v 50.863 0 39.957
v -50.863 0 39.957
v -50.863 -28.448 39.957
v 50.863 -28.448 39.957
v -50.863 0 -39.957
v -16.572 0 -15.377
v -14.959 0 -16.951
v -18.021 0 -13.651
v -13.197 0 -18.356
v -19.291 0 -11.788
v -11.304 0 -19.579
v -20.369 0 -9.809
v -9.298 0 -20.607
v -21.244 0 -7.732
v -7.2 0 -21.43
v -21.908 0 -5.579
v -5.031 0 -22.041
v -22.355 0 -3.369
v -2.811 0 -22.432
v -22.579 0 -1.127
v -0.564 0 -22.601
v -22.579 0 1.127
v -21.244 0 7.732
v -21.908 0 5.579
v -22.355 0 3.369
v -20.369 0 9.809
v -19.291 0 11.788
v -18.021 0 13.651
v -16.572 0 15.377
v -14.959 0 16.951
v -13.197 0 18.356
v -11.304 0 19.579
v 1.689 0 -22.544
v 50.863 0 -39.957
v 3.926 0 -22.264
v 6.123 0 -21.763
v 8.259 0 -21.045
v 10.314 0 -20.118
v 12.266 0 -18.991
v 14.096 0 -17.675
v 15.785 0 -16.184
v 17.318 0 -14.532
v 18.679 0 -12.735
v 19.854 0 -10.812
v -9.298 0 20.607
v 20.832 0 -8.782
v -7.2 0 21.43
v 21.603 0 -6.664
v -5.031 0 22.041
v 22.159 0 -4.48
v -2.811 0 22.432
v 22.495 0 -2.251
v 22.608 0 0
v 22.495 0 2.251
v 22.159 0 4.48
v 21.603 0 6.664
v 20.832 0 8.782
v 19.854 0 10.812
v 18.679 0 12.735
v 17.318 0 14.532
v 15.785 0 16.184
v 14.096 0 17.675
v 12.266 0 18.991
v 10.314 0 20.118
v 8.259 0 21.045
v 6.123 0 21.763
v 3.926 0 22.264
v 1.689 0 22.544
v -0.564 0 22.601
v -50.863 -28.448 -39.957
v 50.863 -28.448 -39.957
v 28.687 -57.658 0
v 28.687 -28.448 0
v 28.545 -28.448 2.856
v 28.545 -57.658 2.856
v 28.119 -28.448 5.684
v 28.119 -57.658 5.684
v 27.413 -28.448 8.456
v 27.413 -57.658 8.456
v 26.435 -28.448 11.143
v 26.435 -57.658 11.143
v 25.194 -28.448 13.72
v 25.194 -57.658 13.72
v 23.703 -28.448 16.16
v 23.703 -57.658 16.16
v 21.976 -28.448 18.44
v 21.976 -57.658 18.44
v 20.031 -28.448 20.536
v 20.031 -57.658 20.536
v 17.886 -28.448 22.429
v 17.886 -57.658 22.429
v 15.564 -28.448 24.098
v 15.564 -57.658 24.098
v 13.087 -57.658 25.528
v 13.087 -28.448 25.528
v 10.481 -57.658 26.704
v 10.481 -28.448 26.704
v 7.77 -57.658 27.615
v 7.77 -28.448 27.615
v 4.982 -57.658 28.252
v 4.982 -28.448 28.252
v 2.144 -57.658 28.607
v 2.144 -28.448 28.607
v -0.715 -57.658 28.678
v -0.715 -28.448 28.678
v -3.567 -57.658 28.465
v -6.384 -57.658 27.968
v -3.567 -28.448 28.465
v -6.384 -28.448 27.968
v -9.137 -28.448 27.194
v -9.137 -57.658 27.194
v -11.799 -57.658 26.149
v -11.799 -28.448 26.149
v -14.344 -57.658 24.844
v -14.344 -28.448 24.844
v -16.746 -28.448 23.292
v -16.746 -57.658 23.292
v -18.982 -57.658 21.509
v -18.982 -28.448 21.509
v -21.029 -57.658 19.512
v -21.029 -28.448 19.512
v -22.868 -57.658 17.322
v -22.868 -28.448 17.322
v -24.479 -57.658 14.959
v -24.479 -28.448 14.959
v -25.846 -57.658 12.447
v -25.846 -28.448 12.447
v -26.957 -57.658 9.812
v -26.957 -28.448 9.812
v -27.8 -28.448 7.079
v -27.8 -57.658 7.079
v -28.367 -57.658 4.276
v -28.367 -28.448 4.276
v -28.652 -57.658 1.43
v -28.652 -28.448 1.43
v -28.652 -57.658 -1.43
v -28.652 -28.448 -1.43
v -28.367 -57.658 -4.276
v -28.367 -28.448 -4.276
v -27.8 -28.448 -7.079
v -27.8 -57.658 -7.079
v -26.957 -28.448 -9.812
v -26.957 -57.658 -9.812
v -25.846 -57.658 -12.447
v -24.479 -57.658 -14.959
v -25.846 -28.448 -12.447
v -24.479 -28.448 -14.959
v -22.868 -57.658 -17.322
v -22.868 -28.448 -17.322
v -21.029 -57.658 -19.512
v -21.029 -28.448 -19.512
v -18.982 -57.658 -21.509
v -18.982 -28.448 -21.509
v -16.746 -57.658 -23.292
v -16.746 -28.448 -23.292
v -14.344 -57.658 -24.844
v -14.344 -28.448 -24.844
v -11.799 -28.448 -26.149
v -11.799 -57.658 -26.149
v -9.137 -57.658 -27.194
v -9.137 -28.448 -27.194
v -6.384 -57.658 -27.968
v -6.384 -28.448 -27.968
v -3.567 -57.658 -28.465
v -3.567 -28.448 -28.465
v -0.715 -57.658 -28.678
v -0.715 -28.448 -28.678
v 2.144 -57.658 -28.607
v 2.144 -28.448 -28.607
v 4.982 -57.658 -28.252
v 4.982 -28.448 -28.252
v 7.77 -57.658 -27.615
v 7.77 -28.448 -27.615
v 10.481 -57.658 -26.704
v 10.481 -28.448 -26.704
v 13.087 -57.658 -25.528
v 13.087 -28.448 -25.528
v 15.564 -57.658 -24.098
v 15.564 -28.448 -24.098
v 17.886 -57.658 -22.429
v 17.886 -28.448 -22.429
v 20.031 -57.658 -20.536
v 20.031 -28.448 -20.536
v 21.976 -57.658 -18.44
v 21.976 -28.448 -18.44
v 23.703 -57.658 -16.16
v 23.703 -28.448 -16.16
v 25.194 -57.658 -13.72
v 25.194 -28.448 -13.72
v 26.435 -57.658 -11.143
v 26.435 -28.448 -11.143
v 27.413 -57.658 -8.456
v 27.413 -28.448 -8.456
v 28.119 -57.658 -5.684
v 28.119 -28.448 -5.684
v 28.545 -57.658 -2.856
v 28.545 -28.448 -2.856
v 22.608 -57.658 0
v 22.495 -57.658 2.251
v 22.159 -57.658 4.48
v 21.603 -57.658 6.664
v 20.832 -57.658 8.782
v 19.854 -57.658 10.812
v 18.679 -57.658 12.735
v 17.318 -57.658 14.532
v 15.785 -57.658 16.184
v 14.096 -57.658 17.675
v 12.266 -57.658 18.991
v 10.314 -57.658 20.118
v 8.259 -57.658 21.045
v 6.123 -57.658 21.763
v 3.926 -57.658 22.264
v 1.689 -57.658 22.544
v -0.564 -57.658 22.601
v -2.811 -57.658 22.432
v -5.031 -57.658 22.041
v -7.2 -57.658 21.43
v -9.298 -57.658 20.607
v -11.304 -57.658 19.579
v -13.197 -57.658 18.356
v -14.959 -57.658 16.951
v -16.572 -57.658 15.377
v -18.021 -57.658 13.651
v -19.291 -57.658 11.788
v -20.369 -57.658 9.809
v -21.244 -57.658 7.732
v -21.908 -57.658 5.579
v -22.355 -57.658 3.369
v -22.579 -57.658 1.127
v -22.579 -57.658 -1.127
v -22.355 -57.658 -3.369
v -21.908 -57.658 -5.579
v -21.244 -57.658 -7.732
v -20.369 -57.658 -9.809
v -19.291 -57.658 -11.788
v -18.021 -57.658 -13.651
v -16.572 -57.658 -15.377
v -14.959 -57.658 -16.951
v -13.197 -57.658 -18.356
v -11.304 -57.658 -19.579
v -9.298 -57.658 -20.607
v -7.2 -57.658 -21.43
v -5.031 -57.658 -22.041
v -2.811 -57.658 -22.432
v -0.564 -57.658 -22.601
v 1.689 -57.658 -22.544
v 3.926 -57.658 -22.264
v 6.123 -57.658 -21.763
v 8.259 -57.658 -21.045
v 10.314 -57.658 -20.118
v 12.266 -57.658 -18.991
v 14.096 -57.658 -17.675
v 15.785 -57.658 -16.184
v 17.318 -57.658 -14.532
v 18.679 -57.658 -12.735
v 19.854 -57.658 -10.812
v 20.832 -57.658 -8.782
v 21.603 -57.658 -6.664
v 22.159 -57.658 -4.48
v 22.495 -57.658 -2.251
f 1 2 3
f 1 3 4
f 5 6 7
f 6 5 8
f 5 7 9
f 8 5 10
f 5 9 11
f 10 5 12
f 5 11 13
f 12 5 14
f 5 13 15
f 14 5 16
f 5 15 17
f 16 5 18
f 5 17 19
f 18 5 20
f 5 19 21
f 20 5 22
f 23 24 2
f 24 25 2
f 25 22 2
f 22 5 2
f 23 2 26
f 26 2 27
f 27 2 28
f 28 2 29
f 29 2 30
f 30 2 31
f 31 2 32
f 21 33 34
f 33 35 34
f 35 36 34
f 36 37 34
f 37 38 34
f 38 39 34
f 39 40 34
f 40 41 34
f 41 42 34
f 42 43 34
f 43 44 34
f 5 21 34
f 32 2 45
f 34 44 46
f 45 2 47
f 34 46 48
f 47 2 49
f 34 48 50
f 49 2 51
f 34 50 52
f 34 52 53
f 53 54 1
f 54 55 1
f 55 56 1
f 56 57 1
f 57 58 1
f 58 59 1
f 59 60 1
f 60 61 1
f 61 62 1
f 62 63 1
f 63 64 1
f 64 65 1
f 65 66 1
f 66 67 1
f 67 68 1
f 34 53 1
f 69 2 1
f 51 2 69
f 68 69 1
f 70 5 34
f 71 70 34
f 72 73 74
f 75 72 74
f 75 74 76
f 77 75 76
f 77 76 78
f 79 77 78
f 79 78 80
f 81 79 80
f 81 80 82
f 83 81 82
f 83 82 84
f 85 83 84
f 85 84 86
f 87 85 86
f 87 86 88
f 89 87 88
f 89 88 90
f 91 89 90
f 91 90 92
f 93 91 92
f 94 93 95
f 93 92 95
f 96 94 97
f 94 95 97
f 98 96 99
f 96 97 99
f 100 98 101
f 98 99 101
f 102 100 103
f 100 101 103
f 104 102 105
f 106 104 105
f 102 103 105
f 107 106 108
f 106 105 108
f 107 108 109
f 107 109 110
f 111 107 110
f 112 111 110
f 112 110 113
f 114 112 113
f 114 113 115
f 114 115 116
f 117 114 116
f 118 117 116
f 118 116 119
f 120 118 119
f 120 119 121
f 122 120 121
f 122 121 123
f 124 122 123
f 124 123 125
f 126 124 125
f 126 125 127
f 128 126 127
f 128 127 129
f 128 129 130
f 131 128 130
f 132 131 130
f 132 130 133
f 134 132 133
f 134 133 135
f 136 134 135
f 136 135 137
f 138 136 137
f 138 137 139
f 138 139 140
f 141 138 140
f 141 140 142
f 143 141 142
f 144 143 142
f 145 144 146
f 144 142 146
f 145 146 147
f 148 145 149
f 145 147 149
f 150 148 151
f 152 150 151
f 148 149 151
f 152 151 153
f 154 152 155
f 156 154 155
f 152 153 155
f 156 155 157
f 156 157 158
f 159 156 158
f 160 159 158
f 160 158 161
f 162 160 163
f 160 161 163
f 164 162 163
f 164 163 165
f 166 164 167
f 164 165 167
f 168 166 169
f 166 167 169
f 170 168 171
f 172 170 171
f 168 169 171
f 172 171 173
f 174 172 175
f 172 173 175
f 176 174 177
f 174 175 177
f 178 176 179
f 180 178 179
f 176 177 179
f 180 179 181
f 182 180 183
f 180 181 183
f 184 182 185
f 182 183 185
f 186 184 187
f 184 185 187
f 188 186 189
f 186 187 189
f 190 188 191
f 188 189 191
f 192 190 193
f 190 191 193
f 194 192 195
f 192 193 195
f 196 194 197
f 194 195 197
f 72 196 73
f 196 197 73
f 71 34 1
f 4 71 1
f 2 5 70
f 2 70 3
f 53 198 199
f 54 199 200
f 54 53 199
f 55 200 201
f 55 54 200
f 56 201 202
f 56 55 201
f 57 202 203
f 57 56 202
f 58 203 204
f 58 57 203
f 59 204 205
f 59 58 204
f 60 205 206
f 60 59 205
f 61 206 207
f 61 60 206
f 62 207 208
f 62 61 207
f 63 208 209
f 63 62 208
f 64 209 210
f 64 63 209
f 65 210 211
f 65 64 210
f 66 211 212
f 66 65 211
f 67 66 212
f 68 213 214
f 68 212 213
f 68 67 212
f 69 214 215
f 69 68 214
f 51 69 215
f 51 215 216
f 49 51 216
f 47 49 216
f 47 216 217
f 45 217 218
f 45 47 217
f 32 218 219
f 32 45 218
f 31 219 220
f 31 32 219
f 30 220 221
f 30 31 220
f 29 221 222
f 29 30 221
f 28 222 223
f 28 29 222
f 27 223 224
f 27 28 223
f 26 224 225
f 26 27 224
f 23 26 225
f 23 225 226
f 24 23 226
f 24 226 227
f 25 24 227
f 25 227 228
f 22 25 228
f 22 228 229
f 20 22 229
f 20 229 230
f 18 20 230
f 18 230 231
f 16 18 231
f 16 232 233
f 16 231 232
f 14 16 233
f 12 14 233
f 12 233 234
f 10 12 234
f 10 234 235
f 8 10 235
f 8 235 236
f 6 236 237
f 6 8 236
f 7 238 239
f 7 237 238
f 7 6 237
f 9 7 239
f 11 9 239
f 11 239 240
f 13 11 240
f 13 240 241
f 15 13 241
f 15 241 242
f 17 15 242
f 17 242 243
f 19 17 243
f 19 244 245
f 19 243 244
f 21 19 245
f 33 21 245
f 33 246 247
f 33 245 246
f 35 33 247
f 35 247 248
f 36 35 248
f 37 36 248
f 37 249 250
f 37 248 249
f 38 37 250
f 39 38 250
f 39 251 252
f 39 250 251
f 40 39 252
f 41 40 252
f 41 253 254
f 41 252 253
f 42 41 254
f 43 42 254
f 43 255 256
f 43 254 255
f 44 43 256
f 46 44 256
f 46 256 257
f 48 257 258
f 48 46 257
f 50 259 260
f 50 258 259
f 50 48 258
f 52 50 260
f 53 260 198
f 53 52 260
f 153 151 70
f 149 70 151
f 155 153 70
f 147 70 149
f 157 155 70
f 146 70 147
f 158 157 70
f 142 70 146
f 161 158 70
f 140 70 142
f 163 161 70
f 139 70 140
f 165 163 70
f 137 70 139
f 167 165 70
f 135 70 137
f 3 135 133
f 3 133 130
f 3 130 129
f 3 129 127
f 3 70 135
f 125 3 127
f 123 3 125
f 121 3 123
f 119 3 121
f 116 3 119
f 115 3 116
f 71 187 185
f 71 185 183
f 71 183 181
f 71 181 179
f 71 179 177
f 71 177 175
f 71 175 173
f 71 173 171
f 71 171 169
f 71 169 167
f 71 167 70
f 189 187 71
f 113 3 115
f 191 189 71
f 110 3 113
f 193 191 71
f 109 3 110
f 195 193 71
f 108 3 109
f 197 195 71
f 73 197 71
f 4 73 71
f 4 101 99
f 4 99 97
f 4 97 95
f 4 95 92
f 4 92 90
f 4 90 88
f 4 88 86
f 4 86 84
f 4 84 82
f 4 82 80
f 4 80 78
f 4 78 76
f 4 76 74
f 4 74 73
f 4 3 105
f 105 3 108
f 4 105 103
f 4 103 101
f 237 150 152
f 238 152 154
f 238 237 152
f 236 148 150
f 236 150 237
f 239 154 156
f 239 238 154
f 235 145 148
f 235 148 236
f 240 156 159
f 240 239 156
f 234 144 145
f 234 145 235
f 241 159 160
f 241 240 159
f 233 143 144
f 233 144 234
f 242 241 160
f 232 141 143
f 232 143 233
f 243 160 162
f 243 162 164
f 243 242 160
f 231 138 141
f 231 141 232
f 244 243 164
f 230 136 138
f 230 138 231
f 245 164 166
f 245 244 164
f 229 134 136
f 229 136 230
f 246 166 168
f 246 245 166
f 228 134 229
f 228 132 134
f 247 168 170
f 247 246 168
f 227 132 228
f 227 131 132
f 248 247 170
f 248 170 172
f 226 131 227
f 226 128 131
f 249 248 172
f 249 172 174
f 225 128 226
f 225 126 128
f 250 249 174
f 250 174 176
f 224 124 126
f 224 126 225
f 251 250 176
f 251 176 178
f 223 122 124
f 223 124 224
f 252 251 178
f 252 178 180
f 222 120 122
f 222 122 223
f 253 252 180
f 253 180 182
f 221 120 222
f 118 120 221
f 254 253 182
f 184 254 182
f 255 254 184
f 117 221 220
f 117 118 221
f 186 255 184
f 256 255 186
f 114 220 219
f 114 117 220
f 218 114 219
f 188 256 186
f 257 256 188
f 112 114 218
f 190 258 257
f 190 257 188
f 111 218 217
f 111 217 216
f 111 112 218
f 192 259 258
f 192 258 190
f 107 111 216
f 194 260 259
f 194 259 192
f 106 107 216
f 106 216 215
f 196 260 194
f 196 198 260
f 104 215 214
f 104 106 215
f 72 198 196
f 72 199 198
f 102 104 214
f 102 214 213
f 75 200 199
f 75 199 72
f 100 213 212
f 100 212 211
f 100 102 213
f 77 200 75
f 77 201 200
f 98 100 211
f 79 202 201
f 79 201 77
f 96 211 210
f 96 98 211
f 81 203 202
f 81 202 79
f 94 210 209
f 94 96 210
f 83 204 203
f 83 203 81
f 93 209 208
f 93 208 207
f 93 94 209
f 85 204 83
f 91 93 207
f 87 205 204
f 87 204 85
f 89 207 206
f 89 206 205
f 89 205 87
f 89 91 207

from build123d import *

# Parameters (mm, degrees)
F0_W     = 101.725624
F0_H     = 79.91349
F1_DEPTH = 28.448
F2_R     = 28.687359
F3_DEPTH = 57.658
F4_R     = 22.607538
F5_DEPTH = 70.866


with BuildPart() as f1:
    # F0 (on Front) → F1 (new body)
    with BuildSketch(Plane.XZ):
        Rectangle(F0_W, F0_H)
    extrude(amount=F1_DEPTH)

    # F2 (on Front) → F3 (join)
    with BuildSketch(Plane.XZ):
        Circle(F2_R)
    extrude(amount=F3_DEPTH)

    # F4 (on Front) → F5 (cut)
    with BuildSketch(Plane.XZ):
        Circle(F4_R)
    extrude(amount=F5_DEPTH, mode=Mode.SUBTRACT)


solid = f1.part
